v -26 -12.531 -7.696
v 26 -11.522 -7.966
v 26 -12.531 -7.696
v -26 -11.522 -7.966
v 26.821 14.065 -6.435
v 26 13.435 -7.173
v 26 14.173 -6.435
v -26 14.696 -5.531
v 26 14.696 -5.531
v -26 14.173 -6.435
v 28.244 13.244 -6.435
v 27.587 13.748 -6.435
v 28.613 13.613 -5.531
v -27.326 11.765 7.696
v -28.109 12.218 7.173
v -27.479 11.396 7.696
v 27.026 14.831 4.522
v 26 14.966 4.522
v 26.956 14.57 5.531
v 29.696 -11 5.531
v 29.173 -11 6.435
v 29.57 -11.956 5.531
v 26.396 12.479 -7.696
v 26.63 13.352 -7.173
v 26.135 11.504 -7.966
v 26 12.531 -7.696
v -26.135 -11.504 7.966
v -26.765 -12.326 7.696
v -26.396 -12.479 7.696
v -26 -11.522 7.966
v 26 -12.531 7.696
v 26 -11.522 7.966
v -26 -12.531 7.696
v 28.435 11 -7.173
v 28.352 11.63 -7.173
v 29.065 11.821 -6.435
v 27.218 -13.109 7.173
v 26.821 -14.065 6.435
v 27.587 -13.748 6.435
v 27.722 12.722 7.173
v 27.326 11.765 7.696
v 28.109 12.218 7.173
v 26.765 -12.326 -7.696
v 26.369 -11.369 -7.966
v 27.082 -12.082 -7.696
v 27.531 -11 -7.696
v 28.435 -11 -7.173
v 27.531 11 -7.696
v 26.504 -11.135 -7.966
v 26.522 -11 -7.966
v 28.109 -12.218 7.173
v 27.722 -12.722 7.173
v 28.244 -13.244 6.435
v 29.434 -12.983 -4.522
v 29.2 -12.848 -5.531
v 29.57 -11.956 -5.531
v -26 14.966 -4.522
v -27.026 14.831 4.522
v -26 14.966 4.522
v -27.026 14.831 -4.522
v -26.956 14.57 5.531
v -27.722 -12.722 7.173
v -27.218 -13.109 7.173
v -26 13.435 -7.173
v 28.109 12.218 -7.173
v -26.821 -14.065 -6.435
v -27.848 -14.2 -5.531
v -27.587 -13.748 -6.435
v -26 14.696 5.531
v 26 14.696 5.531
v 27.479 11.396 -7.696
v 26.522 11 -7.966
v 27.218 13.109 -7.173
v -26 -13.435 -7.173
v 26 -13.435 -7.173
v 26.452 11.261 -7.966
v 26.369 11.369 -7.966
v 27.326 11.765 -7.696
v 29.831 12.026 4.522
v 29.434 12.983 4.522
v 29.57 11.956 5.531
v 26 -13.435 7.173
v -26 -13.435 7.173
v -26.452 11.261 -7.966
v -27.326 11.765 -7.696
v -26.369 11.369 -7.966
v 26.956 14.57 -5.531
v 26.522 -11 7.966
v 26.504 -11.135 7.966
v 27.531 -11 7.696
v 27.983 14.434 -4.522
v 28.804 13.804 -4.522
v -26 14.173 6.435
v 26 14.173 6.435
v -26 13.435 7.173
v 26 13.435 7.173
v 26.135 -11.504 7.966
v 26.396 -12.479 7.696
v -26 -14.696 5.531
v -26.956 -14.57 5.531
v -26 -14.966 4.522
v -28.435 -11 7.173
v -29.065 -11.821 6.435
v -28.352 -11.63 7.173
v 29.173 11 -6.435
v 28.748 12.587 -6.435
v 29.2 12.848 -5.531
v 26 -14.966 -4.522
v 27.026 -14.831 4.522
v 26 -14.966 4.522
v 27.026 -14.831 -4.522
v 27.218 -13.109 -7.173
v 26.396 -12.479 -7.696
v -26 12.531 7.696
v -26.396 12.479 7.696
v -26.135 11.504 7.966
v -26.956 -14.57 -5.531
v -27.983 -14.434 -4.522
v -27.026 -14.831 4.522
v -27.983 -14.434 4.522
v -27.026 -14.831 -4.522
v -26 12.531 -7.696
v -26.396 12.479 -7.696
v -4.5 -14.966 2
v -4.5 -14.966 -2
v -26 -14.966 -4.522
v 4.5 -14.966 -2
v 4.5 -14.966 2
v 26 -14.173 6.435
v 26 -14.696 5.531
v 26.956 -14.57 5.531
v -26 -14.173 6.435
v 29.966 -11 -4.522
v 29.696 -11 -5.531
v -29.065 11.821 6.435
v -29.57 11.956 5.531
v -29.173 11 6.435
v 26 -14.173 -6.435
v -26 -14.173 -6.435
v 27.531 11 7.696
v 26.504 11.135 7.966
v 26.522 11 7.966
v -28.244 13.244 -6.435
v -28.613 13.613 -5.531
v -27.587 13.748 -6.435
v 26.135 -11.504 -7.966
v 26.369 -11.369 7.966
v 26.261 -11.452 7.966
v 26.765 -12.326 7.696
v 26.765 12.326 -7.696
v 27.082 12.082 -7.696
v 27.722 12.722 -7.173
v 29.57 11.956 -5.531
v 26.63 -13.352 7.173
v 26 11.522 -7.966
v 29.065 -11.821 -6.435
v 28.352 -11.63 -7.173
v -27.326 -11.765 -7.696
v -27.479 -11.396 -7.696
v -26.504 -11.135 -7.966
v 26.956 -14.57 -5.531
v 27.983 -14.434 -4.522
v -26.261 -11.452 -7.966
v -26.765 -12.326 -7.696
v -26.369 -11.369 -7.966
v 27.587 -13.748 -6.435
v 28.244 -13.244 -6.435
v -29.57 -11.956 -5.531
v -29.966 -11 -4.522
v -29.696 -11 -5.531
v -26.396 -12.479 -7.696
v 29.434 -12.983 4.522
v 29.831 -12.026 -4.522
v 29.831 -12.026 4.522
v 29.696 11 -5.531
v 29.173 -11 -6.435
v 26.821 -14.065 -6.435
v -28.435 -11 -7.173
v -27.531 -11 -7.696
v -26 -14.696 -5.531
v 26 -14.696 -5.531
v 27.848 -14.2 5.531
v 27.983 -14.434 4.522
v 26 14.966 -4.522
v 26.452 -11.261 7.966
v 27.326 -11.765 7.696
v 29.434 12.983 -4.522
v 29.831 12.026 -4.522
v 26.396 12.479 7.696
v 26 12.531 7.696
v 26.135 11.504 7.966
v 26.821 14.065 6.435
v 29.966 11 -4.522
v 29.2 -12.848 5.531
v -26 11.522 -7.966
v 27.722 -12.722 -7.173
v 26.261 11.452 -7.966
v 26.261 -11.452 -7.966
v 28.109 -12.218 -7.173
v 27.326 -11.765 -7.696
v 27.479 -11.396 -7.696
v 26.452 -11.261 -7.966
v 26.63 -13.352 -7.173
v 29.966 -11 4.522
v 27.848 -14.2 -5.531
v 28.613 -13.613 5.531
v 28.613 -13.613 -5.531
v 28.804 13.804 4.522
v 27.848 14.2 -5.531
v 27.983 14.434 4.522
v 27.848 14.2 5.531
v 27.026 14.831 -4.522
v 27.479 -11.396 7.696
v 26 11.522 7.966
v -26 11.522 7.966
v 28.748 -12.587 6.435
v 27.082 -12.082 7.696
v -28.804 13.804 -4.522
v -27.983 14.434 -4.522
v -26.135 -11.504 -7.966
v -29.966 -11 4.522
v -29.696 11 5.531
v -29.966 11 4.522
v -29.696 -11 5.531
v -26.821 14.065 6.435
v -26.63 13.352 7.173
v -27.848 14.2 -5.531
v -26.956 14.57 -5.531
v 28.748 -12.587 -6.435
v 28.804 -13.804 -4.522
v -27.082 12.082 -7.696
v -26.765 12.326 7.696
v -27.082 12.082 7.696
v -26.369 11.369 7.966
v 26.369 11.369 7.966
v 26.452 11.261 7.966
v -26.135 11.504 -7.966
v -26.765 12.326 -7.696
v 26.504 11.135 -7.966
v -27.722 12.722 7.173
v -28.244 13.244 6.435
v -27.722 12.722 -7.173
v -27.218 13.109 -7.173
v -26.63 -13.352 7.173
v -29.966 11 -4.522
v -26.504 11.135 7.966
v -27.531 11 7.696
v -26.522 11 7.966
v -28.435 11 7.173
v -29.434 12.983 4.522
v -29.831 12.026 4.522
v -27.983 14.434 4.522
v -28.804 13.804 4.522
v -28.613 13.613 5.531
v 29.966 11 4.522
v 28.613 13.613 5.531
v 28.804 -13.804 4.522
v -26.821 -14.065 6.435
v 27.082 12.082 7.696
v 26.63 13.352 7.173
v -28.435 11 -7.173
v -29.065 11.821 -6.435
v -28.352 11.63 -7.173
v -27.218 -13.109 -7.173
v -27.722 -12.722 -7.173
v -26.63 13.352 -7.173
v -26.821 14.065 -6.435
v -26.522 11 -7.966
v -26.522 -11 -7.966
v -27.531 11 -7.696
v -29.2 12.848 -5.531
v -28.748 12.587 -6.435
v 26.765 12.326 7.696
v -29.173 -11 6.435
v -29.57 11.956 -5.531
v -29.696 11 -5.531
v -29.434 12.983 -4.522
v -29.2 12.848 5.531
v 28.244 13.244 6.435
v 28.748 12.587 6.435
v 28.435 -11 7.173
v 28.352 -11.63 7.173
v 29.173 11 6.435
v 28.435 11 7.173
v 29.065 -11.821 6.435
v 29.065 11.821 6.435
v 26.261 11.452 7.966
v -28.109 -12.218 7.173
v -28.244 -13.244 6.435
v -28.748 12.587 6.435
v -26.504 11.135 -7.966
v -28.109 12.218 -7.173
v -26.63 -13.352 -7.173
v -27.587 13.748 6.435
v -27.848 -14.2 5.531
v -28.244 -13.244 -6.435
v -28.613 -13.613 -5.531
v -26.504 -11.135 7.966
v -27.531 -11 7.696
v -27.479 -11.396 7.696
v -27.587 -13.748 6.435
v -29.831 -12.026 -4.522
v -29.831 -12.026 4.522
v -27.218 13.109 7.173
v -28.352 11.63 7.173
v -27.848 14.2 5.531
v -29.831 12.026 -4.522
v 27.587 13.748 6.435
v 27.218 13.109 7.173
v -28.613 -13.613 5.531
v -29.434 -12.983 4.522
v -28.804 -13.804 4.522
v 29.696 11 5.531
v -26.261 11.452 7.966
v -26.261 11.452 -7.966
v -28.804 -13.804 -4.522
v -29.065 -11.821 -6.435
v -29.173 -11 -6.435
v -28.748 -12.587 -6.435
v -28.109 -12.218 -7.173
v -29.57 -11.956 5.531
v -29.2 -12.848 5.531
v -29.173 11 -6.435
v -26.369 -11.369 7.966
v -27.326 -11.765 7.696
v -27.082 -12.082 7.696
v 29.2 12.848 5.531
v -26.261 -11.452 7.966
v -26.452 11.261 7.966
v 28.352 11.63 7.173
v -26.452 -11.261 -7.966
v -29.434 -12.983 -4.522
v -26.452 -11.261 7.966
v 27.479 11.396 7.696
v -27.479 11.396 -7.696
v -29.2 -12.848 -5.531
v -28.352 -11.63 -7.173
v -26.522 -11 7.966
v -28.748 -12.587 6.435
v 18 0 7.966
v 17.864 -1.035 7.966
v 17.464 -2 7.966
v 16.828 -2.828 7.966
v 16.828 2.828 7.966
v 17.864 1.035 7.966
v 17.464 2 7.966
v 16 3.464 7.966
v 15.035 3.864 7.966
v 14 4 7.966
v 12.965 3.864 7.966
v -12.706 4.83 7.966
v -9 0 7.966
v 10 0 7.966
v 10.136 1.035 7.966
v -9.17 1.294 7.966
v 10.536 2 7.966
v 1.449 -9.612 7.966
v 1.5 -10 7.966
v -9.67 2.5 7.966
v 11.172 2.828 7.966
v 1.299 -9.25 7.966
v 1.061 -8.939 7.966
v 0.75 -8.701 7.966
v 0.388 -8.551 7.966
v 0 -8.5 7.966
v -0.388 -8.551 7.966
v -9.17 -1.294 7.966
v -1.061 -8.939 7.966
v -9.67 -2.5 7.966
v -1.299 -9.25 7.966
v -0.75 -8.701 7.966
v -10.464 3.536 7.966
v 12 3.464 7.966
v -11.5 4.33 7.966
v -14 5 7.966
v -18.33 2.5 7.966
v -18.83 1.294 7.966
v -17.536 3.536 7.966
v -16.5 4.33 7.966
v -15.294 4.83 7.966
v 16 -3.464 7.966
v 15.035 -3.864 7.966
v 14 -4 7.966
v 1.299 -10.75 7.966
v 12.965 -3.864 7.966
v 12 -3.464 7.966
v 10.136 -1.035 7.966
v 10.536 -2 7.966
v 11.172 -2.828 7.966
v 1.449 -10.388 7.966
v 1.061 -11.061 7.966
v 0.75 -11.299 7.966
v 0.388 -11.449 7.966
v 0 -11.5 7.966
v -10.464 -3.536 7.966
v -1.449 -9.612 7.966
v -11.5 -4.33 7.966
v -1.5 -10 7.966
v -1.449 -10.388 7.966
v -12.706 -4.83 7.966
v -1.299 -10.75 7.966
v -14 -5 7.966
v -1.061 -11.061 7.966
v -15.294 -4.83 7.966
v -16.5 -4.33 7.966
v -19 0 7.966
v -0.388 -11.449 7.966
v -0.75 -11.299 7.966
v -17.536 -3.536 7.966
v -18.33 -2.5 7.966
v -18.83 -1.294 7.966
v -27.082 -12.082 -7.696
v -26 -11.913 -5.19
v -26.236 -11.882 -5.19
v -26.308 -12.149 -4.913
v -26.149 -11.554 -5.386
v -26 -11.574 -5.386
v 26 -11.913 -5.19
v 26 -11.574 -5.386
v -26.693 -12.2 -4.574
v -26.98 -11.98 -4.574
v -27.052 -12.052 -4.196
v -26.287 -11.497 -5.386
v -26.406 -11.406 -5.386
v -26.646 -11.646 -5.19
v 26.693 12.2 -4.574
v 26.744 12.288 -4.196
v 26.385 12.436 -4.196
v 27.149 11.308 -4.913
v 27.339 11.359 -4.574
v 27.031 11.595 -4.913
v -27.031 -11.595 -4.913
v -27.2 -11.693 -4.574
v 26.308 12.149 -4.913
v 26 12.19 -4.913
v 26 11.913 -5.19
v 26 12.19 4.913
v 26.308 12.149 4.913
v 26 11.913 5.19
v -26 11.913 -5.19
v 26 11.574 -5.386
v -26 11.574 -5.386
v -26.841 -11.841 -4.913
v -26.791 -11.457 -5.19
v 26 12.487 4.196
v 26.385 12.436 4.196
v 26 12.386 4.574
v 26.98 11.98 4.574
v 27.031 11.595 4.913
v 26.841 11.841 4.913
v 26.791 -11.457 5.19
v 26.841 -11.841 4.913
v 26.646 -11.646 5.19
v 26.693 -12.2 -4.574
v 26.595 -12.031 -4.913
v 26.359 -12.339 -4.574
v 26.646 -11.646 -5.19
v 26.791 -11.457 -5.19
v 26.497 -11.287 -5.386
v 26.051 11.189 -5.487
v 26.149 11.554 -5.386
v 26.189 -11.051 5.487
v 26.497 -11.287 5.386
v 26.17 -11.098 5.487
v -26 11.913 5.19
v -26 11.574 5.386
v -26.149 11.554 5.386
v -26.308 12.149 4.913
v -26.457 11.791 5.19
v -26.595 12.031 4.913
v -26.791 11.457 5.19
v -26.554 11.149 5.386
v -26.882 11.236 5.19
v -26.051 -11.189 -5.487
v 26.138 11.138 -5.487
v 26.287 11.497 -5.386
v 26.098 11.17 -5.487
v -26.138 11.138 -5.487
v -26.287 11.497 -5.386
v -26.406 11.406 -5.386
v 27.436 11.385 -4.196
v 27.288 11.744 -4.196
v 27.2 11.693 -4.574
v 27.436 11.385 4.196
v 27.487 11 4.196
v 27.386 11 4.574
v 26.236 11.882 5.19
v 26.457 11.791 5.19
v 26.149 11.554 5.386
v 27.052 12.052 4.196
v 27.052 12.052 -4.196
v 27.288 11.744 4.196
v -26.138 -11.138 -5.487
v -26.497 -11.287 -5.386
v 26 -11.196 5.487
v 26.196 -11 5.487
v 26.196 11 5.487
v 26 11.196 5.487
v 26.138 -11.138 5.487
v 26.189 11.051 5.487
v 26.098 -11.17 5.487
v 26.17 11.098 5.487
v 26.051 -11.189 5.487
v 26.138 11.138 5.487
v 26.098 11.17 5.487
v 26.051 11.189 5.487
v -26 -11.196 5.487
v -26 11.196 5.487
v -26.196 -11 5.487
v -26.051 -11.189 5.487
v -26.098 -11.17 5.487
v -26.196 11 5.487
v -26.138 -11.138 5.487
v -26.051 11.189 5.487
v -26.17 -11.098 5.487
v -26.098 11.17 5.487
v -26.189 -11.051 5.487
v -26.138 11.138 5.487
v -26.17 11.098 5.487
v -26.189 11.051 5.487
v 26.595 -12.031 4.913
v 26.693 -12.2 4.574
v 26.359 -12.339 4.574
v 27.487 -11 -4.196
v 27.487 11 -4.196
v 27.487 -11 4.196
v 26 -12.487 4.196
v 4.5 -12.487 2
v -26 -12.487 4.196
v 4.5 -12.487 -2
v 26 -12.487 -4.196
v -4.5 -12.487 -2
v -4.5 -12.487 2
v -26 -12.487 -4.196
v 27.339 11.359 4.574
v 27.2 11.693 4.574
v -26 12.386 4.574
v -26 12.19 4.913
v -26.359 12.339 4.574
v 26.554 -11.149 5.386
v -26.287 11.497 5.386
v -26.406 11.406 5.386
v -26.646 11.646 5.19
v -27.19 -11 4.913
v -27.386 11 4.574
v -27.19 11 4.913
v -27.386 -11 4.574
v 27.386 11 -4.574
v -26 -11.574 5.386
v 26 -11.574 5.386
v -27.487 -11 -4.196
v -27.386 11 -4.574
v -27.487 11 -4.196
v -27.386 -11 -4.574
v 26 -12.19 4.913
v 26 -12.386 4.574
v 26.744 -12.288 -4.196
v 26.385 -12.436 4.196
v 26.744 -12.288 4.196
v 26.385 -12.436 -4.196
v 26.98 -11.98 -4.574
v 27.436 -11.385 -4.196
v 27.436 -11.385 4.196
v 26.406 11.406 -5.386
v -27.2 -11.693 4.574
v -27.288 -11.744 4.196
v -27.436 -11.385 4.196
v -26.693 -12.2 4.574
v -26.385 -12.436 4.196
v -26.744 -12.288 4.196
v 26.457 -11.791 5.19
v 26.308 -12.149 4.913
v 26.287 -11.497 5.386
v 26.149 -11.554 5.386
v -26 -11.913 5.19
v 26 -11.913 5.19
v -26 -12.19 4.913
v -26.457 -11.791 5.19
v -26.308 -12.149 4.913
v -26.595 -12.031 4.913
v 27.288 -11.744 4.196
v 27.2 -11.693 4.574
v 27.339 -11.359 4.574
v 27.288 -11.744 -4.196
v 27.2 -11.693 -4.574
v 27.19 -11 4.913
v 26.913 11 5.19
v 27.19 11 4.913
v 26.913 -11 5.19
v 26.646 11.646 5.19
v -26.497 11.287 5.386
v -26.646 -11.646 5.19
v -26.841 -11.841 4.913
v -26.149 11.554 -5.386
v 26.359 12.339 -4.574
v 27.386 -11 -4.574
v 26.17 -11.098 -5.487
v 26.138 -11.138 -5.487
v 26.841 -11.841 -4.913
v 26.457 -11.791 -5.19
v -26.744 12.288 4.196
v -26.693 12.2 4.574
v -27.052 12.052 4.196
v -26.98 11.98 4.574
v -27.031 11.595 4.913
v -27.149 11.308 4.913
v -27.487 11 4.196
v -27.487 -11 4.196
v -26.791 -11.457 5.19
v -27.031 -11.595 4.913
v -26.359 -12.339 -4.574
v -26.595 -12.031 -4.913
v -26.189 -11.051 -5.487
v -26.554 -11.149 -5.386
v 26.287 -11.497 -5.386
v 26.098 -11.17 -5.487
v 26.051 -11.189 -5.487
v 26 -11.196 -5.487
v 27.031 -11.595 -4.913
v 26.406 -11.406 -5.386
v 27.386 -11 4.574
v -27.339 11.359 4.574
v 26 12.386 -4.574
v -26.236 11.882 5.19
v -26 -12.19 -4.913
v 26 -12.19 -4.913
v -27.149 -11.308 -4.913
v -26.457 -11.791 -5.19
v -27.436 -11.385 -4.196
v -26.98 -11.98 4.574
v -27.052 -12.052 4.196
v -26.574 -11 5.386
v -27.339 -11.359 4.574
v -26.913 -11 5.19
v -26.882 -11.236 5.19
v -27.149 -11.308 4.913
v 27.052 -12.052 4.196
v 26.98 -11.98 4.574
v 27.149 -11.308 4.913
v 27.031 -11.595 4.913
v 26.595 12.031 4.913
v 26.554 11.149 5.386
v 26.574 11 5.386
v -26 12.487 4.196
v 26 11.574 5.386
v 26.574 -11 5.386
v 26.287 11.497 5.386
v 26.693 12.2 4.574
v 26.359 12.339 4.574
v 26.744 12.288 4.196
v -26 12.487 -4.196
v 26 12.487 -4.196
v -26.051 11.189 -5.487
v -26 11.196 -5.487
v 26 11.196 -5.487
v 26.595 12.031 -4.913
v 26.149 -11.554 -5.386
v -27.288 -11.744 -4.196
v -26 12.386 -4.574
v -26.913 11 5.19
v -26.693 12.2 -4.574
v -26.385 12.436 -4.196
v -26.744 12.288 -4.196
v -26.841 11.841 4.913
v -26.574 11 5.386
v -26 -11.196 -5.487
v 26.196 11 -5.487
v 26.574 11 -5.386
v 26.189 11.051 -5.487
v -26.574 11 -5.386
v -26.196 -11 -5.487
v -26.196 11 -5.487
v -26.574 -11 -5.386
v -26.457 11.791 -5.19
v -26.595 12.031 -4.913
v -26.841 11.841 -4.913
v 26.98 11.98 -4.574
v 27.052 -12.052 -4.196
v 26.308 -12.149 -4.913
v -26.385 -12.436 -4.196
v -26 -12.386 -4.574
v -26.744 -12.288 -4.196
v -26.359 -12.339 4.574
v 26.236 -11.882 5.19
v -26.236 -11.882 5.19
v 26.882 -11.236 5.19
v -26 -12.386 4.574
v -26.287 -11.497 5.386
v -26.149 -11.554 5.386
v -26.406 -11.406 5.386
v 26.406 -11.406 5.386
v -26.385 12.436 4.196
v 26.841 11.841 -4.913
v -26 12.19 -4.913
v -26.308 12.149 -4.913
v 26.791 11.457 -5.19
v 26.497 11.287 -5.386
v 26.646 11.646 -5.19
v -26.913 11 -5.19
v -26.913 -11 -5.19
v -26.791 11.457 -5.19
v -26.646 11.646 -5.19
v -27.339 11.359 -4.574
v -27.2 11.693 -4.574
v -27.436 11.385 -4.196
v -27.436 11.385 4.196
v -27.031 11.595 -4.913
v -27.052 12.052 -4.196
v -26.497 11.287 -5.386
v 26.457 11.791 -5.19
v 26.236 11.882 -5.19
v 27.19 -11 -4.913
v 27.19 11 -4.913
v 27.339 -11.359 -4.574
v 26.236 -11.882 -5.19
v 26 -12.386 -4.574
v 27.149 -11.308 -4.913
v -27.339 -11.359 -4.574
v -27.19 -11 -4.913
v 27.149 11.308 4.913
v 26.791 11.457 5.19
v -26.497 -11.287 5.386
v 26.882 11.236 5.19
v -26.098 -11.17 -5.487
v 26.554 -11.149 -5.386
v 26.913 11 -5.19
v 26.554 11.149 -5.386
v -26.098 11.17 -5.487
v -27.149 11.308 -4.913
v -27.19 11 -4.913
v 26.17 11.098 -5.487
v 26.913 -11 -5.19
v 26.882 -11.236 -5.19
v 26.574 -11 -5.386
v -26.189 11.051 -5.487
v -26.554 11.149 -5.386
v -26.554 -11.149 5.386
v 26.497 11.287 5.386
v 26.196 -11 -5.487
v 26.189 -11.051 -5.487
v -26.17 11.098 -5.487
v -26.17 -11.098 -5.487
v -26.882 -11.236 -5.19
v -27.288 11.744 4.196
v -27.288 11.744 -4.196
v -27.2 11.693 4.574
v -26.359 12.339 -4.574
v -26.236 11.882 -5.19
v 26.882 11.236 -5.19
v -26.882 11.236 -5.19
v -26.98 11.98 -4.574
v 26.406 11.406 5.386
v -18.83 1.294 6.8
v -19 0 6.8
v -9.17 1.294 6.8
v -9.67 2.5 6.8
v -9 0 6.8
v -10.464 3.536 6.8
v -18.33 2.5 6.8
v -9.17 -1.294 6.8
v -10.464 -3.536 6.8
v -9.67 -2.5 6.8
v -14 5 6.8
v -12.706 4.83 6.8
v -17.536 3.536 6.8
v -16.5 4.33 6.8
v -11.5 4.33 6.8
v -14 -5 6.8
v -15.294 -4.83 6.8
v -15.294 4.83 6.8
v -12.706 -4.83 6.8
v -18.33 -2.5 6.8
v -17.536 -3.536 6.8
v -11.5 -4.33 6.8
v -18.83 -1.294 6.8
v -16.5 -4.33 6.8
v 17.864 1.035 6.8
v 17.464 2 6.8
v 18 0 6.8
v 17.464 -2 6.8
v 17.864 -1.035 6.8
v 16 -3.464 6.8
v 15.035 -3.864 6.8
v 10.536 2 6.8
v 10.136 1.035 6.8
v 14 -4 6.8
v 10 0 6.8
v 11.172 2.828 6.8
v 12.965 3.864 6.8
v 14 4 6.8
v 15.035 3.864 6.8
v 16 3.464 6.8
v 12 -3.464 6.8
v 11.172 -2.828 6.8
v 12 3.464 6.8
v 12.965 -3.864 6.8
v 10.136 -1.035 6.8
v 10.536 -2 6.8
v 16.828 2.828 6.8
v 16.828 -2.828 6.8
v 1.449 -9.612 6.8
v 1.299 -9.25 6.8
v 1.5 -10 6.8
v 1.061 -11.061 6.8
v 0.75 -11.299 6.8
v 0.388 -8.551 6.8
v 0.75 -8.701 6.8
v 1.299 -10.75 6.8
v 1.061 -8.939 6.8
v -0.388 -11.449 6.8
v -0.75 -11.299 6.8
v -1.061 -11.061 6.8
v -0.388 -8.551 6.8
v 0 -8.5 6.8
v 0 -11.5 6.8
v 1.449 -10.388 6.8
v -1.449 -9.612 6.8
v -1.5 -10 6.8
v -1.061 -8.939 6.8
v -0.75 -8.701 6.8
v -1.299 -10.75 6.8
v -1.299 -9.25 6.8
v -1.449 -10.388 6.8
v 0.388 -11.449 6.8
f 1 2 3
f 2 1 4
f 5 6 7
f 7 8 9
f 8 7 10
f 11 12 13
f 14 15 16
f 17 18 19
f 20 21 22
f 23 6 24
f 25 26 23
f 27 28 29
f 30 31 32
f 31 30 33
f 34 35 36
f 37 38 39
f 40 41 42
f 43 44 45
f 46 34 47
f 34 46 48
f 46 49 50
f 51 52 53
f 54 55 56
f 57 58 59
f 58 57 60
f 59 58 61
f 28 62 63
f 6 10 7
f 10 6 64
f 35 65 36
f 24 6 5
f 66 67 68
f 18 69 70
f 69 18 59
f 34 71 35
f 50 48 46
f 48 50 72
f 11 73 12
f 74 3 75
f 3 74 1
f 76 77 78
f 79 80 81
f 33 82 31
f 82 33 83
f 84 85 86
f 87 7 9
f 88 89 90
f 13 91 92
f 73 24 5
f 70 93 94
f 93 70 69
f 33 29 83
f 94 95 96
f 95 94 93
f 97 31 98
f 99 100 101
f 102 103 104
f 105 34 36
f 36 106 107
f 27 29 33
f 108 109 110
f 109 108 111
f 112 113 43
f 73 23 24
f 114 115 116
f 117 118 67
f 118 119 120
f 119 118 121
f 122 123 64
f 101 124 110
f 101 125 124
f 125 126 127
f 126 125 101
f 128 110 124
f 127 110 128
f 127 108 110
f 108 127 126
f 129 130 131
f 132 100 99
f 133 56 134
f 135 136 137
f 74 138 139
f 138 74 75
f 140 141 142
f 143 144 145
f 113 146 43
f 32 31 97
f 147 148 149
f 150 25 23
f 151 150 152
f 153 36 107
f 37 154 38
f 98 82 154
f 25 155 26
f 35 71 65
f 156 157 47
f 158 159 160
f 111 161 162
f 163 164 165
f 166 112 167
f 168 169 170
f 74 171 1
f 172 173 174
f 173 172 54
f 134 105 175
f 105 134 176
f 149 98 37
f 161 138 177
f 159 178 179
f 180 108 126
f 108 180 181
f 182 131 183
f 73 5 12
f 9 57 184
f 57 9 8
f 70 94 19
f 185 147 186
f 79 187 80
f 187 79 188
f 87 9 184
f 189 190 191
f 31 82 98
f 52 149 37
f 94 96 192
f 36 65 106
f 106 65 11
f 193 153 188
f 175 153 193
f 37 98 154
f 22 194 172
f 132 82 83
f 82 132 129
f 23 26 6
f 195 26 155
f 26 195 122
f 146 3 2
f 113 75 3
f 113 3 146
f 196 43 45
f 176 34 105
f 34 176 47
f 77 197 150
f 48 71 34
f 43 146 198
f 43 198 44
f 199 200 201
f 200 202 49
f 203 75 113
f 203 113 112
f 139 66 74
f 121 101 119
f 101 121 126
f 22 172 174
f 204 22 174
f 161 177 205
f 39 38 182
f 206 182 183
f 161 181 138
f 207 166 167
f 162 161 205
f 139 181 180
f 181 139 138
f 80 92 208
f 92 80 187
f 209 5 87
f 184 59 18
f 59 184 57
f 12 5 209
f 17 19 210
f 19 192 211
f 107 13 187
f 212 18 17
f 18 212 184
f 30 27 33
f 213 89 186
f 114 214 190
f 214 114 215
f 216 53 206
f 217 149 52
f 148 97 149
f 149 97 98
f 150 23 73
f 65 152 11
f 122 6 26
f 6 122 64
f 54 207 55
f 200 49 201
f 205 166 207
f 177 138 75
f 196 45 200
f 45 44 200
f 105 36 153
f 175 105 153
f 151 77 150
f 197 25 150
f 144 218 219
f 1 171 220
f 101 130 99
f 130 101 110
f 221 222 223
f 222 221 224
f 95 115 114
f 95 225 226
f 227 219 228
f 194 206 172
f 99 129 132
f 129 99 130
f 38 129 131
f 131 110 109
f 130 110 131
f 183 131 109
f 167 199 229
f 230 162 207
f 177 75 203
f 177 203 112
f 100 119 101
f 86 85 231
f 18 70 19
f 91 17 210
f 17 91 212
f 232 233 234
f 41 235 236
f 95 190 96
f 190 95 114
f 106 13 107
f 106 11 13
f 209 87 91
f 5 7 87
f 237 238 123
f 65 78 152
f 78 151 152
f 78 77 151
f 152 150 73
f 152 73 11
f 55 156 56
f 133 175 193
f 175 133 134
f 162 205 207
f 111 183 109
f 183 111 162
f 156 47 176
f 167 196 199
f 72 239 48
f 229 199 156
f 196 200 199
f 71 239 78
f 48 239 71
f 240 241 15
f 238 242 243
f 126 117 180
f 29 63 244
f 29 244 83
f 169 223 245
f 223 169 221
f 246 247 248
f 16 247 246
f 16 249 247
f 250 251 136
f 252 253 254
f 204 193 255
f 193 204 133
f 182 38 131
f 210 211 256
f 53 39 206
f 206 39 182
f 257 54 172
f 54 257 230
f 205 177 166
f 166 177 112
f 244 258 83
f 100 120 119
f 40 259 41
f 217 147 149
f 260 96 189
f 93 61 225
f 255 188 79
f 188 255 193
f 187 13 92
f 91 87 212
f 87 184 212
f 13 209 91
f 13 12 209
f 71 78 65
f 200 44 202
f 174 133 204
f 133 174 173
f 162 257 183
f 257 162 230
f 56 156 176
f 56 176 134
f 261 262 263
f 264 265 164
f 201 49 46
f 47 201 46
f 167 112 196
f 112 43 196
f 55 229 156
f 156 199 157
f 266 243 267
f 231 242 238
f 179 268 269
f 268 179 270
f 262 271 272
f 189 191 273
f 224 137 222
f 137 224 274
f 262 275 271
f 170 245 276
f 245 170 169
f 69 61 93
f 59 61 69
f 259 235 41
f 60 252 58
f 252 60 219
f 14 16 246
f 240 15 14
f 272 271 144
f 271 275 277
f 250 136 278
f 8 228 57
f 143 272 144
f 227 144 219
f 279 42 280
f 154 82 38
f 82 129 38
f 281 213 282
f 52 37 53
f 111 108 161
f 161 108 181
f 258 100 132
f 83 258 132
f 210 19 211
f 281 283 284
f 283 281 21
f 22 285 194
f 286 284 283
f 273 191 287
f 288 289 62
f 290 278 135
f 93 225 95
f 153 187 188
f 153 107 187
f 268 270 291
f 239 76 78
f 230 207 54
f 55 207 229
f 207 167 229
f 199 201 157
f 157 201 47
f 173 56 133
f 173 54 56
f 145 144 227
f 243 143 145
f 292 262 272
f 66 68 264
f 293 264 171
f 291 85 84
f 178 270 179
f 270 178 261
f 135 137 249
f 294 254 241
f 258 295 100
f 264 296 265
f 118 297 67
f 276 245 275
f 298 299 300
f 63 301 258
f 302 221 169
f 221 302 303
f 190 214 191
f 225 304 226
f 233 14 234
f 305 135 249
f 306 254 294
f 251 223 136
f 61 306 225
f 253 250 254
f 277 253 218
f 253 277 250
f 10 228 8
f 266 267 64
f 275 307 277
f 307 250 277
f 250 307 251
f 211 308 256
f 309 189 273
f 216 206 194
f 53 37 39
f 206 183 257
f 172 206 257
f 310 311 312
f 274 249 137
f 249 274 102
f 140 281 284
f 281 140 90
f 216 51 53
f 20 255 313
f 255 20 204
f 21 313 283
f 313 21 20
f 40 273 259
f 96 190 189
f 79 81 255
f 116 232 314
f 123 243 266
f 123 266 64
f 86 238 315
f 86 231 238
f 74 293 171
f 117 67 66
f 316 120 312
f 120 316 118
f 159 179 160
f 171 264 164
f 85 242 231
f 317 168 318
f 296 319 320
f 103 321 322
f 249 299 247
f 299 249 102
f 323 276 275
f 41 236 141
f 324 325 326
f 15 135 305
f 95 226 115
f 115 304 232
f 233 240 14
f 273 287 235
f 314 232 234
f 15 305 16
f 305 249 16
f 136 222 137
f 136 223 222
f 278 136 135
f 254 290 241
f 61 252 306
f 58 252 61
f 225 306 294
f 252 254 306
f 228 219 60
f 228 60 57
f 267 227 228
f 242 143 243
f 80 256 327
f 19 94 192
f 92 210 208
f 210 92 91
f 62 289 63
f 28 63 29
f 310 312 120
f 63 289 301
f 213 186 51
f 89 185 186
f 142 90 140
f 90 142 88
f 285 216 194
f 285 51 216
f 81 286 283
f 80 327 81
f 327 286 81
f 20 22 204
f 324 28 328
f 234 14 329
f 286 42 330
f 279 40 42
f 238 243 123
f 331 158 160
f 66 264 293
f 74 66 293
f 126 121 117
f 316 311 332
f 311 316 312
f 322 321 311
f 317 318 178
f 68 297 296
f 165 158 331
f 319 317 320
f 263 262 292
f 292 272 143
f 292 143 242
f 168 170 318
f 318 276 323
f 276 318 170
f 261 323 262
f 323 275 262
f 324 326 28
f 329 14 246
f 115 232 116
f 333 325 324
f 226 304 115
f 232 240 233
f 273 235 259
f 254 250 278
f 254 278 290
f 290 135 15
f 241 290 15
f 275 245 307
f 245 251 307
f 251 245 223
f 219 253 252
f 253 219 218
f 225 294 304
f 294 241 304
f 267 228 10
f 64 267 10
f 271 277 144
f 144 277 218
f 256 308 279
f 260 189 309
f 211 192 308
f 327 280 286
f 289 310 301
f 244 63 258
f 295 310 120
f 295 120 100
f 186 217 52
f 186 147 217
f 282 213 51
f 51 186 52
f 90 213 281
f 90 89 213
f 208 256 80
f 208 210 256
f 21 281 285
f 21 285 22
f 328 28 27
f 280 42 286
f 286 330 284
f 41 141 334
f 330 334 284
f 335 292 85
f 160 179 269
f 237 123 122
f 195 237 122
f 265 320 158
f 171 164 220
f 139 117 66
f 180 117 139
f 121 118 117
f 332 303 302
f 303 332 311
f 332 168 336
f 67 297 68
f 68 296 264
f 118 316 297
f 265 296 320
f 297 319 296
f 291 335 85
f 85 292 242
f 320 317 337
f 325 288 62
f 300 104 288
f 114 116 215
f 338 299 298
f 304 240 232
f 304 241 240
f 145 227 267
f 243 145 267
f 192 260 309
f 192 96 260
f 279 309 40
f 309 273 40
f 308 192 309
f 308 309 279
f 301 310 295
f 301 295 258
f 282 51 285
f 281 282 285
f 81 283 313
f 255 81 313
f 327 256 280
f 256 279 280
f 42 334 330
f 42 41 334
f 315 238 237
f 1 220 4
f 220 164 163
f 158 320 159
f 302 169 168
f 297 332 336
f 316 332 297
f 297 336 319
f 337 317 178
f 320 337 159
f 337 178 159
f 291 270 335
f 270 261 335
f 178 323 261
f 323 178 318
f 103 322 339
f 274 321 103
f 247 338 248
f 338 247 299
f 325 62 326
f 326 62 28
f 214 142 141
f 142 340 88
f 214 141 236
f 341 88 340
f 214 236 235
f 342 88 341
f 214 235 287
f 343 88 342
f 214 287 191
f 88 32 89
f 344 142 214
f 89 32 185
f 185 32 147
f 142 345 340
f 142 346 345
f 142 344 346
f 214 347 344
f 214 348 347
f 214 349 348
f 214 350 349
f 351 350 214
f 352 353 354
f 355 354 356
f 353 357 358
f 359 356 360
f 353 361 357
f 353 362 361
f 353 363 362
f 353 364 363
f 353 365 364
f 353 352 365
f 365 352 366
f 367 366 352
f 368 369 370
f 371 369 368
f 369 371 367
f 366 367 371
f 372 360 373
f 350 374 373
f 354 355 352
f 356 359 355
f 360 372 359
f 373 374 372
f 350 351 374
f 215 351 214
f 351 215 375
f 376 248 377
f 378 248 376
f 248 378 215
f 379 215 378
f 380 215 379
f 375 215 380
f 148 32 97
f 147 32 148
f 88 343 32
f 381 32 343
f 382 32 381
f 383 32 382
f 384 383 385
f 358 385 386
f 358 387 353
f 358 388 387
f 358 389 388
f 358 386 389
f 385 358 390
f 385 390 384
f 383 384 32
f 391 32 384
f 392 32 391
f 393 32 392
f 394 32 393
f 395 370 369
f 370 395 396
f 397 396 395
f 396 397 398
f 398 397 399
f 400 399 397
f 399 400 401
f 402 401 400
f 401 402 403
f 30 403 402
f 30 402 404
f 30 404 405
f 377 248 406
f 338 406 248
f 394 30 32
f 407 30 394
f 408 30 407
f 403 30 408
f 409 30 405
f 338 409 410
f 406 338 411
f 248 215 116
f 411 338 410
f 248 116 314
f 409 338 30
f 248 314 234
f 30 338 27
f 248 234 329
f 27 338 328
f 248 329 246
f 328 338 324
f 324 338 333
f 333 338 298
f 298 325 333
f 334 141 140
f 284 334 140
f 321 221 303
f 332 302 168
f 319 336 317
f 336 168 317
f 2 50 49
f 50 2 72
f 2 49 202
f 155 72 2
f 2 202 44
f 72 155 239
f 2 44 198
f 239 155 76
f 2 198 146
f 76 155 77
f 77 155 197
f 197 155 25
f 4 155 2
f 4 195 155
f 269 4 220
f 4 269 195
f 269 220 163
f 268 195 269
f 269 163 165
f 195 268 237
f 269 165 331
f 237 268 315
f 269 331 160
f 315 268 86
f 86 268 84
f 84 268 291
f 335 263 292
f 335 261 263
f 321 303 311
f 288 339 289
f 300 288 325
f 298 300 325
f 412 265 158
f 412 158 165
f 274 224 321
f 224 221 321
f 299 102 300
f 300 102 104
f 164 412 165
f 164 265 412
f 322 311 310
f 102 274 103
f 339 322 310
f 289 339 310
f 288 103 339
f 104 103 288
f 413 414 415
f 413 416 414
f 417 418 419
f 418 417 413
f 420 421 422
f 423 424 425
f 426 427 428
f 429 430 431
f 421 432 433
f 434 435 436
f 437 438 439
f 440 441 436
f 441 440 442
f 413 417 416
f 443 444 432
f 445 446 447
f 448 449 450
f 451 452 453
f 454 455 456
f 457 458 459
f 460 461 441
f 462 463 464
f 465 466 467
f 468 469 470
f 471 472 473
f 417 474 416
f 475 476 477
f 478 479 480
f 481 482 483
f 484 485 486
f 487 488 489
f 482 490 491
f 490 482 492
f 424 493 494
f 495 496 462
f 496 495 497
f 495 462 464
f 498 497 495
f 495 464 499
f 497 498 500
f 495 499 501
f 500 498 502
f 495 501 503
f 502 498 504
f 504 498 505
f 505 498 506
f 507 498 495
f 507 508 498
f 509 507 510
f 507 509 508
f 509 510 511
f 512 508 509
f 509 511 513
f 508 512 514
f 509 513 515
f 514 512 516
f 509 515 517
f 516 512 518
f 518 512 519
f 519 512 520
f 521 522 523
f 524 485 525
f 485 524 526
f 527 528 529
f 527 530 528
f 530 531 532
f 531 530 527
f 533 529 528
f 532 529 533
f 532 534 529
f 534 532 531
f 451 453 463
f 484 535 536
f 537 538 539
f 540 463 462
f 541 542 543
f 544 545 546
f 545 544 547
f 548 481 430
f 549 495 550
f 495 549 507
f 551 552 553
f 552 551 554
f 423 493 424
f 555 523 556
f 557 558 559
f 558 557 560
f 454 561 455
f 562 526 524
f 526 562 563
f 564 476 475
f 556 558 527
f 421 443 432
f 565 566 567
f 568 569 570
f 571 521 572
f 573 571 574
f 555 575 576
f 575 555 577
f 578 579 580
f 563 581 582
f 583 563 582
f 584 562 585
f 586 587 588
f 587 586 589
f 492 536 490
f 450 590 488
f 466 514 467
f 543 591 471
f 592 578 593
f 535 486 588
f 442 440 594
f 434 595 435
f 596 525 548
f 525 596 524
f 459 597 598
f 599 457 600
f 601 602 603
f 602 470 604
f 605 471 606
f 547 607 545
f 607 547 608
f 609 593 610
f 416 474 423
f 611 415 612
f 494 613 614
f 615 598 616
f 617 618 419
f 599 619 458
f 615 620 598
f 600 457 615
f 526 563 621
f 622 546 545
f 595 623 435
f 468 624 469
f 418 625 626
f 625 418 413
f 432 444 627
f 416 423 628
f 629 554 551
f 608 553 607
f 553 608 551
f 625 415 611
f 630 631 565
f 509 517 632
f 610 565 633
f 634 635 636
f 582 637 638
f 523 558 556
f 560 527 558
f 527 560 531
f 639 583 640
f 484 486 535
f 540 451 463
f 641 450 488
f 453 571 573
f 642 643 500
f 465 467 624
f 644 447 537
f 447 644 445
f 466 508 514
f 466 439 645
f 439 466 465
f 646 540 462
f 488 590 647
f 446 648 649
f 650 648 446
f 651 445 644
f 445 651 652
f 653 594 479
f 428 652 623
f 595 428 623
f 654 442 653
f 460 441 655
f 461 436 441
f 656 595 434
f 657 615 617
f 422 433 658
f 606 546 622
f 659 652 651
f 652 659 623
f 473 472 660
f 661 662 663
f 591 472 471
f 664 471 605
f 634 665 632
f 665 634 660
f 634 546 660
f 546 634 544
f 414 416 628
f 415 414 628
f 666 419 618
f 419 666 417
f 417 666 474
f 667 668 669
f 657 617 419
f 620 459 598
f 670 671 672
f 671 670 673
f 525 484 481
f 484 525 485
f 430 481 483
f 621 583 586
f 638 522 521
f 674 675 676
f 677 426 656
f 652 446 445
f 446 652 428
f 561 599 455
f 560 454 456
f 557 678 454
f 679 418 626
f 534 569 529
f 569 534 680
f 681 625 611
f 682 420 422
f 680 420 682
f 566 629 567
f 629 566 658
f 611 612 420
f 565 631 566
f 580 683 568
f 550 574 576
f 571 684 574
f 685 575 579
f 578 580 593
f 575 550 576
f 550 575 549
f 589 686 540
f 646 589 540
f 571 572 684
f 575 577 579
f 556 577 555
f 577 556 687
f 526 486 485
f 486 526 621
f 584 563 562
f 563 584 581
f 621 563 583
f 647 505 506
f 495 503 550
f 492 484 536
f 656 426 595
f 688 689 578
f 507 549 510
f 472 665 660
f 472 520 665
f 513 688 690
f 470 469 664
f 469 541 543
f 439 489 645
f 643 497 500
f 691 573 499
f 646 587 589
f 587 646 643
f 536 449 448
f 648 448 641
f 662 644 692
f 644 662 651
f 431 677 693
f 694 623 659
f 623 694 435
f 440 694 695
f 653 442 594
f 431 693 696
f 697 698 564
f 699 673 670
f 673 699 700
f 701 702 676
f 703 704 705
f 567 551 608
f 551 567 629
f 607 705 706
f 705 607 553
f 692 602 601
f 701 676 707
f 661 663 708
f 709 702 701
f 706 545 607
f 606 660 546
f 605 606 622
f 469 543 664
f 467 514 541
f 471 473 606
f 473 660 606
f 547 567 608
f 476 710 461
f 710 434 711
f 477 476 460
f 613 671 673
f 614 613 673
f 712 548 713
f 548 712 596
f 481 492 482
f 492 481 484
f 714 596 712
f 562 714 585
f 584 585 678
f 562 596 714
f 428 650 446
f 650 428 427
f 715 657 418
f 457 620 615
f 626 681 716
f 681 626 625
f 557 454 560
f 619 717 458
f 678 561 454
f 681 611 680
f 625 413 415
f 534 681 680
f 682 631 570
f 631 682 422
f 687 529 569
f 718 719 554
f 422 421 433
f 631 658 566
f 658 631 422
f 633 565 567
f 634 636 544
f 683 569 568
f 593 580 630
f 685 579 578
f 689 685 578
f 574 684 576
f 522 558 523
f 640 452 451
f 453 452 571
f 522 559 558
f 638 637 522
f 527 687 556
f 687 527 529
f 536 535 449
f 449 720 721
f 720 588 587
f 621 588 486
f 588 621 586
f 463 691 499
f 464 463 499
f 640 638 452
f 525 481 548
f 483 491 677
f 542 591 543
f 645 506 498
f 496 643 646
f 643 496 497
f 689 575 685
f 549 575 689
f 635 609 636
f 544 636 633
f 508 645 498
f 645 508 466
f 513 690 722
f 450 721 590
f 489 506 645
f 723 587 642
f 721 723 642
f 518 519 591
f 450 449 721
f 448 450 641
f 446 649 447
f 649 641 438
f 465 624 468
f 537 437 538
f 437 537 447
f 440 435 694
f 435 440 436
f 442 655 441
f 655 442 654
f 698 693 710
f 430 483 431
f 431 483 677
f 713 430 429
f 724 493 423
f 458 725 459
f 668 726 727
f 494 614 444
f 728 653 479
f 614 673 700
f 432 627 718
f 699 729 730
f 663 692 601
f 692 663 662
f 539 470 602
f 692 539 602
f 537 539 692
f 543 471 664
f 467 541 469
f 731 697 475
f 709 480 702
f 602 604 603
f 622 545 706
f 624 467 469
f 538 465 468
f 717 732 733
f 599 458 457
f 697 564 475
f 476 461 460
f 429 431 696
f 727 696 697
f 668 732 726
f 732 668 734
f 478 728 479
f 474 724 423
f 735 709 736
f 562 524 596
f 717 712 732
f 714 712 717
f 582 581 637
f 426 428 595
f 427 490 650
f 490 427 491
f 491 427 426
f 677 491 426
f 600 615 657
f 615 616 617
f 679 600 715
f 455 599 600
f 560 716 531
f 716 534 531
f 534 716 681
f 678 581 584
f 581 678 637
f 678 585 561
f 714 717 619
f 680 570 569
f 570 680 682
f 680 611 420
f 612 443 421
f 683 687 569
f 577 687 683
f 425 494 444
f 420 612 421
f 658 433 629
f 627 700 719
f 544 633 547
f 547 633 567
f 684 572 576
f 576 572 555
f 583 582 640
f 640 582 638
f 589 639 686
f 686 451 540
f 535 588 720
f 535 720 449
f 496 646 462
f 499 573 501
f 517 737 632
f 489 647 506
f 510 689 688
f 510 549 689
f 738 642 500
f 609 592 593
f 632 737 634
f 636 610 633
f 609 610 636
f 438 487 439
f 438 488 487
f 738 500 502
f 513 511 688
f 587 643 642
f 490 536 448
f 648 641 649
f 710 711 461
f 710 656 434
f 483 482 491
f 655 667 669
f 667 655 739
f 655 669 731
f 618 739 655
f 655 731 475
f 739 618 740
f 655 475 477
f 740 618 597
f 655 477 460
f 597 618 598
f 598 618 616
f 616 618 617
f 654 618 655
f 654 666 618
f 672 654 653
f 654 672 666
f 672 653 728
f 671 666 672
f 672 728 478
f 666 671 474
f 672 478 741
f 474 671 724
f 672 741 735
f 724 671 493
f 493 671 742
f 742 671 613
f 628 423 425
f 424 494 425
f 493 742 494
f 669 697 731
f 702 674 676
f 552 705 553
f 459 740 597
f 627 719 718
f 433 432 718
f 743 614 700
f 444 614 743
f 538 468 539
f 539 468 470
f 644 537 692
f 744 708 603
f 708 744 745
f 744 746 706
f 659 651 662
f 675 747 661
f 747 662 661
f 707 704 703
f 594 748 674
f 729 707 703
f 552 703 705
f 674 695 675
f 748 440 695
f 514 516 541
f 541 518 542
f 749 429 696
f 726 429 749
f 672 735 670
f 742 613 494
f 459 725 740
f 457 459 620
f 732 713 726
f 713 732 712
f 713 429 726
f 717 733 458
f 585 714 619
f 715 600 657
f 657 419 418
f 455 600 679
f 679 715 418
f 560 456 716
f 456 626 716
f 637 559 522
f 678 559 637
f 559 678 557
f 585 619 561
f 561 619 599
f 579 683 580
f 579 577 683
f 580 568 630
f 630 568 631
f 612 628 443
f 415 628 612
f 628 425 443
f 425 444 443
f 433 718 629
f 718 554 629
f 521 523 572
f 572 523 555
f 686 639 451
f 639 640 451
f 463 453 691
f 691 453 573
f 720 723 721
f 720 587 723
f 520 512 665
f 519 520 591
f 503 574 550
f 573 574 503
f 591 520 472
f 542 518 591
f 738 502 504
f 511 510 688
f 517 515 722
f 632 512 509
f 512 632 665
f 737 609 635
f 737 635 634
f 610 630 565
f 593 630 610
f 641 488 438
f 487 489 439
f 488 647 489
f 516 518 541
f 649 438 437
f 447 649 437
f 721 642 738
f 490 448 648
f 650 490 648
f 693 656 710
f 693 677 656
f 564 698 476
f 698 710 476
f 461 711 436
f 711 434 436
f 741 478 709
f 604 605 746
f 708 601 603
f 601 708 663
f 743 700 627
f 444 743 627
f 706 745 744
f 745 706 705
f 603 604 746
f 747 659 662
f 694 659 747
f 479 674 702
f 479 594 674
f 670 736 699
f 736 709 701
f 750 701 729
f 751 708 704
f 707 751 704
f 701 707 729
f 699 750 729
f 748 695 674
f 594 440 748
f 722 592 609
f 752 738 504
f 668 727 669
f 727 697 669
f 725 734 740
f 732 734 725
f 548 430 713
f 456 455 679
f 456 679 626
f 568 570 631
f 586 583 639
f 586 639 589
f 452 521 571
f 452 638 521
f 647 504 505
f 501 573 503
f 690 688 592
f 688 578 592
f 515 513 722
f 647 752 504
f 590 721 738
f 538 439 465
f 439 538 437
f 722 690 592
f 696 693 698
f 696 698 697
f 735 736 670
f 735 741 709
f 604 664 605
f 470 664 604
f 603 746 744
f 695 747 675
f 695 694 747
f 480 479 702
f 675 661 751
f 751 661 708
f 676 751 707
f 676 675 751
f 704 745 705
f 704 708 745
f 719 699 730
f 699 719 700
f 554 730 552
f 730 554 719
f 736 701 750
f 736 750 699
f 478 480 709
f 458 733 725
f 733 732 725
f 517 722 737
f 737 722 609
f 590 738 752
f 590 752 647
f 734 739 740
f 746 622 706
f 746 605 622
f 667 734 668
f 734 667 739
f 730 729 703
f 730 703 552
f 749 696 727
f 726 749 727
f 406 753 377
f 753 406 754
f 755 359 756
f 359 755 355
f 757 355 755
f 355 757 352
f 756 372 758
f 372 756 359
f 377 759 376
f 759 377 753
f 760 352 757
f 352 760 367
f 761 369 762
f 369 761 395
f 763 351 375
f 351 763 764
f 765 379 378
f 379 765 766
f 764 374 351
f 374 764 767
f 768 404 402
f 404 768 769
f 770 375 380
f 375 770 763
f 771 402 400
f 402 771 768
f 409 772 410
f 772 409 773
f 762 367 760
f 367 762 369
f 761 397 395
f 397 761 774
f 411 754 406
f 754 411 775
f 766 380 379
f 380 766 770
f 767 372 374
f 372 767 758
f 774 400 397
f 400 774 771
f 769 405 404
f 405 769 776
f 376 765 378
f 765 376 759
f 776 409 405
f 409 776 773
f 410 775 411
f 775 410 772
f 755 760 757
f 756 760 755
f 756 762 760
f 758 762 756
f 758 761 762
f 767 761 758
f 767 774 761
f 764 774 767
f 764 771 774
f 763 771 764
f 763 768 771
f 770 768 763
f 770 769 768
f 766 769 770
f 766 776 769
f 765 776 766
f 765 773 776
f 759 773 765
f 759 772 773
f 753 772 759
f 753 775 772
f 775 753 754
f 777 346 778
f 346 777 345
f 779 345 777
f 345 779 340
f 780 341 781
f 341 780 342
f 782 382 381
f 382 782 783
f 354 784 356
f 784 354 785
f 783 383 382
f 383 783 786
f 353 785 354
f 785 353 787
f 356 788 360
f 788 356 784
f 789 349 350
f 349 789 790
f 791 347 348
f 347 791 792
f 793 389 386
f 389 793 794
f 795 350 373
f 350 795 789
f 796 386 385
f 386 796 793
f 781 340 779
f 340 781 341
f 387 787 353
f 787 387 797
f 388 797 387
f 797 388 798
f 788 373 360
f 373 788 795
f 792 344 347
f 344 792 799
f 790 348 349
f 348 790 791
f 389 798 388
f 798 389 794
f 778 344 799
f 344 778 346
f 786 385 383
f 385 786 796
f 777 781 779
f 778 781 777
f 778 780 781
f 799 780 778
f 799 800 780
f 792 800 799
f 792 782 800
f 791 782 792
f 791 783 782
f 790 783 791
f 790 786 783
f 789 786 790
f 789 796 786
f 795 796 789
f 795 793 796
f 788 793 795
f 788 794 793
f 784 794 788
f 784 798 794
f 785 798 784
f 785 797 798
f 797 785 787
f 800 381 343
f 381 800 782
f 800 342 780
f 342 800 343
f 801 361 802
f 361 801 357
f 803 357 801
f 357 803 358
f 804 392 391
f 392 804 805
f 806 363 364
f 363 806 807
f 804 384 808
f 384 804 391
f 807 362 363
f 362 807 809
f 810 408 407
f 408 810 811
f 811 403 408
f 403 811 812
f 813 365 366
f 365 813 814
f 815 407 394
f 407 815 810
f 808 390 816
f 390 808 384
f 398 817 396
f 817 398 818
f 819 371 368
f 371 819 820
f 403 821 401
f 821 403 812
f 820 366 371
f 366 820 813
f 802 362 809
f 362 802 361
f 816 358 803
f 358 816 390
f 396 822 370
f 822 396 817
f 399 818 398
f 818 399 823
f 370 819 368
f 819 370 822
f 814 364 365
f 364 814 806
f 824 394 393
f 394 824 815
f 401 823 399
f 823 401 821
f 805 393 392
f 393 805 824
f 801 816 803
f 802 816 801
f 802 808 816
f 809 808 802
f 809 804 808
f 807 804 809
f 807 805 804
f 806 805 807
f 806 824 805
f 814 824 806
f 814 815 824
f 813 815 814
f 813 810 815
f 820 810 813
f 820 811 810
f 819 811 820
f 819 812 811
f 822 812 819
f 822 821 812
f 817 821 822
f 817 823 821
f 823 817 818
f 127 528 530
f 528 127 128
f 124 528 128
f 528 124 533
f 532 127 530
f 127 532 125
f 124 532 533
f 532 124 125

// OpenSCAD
// ============================================================
//  Ohisje senzorskega modula za zaznavo gest z rokami
//  (kamera + ToF senzor), gleda navzgor proti rokam
//  Projektna vaja - Uvod v racunalnisko geometrijo
//
//  SOLID model: "ploskve z debelino", votla notranjost.
//
//  STIKALI:
//    sensors_through = false -> senzorska okna so VDOLBINE
//                               -> votlina ostane ZAPRTA (vrzel)
//    sensors_through = true  -> okna prebijejo steno -> votlina ODPRTA
//    ports = true            -> kabelski port skozi zadnjo steno
//
//  Za 4. korak (demo zaznave vrzeli) pusti oboje na false.
// ============================================================

// ---------------- Glavno telo (vse v mm) ---------------------
body_l   = 60;     // sirina modula
body_w   = 30;     // globina
body_h   = 16;     // visina
wall     = 2.5;    // debelina sten  <-- vecja od velikosti voksla!
corner_r = 4;

// ---------------- Senzorska okna na zgornji ploskvi ----------
cam_r  = 5;    cam_x = -14;   // kamera
tof_r  = 4;    tof_x =  14;   // ToF senzor
led_r  = 1.5;  led_y = -10;   // LED indikator (pri x = 0)

sensors_through = false;       // glej opis zgoraj
sensor_depth = sensors_through ? (wall + 2) : 1.2;  // globina vdolbine

// ---------------- Kabelski port (zadnja -y stena) ------------
ports  = true;
usb_w  = 9;
usb_h  = 4;

// ---------------- Locljivost / st. trikotnikov ---------------
$fn = 24;          // za vokselizacijo zacni z 16-24
eps = 0.05;

// ------------------------------------------------------------
//  Pomozni modul: zaobljen kvader (hull 8 krogel)
// ------------------------------------------------------------
module rounded_box(l, w, h, r) {
    hull()
        for (sx = [-1, 1], sy = [-1, 1], sz = [-1, 1])
            translate([sx*(l/2 - r), sy*(w/2 - r), sz*(h/2 - r)])
                sphere(r);
}

// senzorsko okno: valj, ki gre z vrha navzdol za sensor_depth
module sensor_window(px, py, r) {
    translate([px, py, body_h/2 - sensor_depth/2 + eps])
        cylinder(h = sensor_depth + 2*eps, r = r, center = true);
}

// ------------------------------------------------------------
//  Glavno ohisje
// ------------------------------------------------------------
module ohisje() {
    difference() {
        // telo z votlino in senzorskimi okni
        difference() {
            rounded_box(body_l, body_w, body_h, corner_r);

            // notranja votlina
            rounded_box(body_l - 2*wall,
                        body_w - 2*wall,
                        body_h - 2*wall,
                        max(corner_r - wall, 0.6));

            // senzorska okna (vdolbine, ce sensors_through == false)
            sensor_window(cam_x, 0,     cam_r);   // kamera
            sensor_window(tof_x, 0,     tof_r);   // ToF
            sensor_window(0,     led_y, led_r);   // LED
        }

        // kabelski port skozi zadnjo (-y) steno (samo ce ports)
        if (ports)
            translate([0, -body_w/2 - 1, 0])
                cube([usb_w, 2*wall + 4, usb_h], center = true);
    }
}

ohisje();
